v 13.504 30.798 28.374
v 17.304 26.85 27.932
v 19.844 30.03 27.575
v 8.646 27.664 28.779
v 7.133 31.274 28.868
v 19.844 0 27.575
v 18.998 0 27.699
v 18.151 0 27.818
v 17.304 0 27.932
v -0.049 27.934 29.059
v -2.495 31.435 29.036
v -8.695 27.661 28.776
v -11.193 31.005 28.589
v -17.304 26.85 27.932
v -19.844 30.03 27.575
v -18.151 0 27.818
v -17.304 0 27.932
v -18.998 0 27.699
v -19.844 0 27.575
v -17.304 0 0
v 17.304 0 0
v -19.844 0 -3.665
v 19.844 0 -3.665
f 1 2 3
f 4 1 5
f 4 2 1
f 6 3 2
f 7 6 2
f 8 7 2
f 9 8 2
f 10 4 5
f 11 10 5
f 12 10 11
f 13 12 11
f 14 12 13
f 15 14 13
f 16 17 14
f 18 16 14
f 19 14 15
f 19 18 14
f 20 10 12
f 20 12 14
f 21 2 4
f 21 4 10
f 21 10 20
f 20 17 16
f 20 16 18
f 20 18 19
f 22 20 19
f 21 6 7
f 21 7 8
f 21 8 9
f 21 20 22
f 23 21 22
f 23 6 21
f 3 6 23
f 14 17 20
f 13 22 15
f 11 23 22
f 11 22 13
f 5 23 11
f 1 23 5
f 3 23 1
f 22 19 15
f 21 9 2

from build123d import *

# Parameters (mm, degrees)
F1_DEPTH      = 19.84375
F1_DEPTH_BACK = 19.84375
F2_START      = 17.30375
F2_DEPTH      = 2.54
F3_START      = -17.30375
F3_DEPTH      = 2.54
F4_R          = 159.2477786005
F4_R_2        = 133.35
F5_DEPTH      = 127


with BuildPart() as f1:
    # F0 (on Right) → F1 (new body, two sides)
    with BuildSketch(Plane.YZ) as f1_sk:
        Polygon((31.5376230345, 32.8083333333), (0, 0), (0, -3.6651832175), (35.060848841, 32.8083333333), align=None)
    extrude(amount=F1_DEPTH)
    extrude(f1_sk.sketch, amount=-F1_DEPTH_BACK)

    # F0 (on Right) → F2 (join)
    with BuildSketch(Plane.YZ.offset(F2_START)):
        Polygon((0, 32.8083333333), (0, 0), (31.5376230345, 32.8083333333), align=None)
    extrude(amount=F2_DEPTH)

    # F0 (on Right) → F3 (join)
    with BuildSketch(Plane.YZ.offset(F3_START)):
        Polygon((0, 32.8083333333), (0, 0), (31.5376230345, 32.8083333333), align=None)
    extrude(amount=-F3_DEPTH)

    # F4 (on Front) → F5 (cut)
    with BuildSketch(Plane.XZ):
        with Locations((0, -104.29066769)):
            Circle(F4_R)
        with Locations((0, -104.29066769)):
            Circle(F4_R_2, mode=Mode.SUBTRACT)
    extrude(amount=-F5_DEPTH, mode=Mode.SUBTRACT)


solid = f1.part
